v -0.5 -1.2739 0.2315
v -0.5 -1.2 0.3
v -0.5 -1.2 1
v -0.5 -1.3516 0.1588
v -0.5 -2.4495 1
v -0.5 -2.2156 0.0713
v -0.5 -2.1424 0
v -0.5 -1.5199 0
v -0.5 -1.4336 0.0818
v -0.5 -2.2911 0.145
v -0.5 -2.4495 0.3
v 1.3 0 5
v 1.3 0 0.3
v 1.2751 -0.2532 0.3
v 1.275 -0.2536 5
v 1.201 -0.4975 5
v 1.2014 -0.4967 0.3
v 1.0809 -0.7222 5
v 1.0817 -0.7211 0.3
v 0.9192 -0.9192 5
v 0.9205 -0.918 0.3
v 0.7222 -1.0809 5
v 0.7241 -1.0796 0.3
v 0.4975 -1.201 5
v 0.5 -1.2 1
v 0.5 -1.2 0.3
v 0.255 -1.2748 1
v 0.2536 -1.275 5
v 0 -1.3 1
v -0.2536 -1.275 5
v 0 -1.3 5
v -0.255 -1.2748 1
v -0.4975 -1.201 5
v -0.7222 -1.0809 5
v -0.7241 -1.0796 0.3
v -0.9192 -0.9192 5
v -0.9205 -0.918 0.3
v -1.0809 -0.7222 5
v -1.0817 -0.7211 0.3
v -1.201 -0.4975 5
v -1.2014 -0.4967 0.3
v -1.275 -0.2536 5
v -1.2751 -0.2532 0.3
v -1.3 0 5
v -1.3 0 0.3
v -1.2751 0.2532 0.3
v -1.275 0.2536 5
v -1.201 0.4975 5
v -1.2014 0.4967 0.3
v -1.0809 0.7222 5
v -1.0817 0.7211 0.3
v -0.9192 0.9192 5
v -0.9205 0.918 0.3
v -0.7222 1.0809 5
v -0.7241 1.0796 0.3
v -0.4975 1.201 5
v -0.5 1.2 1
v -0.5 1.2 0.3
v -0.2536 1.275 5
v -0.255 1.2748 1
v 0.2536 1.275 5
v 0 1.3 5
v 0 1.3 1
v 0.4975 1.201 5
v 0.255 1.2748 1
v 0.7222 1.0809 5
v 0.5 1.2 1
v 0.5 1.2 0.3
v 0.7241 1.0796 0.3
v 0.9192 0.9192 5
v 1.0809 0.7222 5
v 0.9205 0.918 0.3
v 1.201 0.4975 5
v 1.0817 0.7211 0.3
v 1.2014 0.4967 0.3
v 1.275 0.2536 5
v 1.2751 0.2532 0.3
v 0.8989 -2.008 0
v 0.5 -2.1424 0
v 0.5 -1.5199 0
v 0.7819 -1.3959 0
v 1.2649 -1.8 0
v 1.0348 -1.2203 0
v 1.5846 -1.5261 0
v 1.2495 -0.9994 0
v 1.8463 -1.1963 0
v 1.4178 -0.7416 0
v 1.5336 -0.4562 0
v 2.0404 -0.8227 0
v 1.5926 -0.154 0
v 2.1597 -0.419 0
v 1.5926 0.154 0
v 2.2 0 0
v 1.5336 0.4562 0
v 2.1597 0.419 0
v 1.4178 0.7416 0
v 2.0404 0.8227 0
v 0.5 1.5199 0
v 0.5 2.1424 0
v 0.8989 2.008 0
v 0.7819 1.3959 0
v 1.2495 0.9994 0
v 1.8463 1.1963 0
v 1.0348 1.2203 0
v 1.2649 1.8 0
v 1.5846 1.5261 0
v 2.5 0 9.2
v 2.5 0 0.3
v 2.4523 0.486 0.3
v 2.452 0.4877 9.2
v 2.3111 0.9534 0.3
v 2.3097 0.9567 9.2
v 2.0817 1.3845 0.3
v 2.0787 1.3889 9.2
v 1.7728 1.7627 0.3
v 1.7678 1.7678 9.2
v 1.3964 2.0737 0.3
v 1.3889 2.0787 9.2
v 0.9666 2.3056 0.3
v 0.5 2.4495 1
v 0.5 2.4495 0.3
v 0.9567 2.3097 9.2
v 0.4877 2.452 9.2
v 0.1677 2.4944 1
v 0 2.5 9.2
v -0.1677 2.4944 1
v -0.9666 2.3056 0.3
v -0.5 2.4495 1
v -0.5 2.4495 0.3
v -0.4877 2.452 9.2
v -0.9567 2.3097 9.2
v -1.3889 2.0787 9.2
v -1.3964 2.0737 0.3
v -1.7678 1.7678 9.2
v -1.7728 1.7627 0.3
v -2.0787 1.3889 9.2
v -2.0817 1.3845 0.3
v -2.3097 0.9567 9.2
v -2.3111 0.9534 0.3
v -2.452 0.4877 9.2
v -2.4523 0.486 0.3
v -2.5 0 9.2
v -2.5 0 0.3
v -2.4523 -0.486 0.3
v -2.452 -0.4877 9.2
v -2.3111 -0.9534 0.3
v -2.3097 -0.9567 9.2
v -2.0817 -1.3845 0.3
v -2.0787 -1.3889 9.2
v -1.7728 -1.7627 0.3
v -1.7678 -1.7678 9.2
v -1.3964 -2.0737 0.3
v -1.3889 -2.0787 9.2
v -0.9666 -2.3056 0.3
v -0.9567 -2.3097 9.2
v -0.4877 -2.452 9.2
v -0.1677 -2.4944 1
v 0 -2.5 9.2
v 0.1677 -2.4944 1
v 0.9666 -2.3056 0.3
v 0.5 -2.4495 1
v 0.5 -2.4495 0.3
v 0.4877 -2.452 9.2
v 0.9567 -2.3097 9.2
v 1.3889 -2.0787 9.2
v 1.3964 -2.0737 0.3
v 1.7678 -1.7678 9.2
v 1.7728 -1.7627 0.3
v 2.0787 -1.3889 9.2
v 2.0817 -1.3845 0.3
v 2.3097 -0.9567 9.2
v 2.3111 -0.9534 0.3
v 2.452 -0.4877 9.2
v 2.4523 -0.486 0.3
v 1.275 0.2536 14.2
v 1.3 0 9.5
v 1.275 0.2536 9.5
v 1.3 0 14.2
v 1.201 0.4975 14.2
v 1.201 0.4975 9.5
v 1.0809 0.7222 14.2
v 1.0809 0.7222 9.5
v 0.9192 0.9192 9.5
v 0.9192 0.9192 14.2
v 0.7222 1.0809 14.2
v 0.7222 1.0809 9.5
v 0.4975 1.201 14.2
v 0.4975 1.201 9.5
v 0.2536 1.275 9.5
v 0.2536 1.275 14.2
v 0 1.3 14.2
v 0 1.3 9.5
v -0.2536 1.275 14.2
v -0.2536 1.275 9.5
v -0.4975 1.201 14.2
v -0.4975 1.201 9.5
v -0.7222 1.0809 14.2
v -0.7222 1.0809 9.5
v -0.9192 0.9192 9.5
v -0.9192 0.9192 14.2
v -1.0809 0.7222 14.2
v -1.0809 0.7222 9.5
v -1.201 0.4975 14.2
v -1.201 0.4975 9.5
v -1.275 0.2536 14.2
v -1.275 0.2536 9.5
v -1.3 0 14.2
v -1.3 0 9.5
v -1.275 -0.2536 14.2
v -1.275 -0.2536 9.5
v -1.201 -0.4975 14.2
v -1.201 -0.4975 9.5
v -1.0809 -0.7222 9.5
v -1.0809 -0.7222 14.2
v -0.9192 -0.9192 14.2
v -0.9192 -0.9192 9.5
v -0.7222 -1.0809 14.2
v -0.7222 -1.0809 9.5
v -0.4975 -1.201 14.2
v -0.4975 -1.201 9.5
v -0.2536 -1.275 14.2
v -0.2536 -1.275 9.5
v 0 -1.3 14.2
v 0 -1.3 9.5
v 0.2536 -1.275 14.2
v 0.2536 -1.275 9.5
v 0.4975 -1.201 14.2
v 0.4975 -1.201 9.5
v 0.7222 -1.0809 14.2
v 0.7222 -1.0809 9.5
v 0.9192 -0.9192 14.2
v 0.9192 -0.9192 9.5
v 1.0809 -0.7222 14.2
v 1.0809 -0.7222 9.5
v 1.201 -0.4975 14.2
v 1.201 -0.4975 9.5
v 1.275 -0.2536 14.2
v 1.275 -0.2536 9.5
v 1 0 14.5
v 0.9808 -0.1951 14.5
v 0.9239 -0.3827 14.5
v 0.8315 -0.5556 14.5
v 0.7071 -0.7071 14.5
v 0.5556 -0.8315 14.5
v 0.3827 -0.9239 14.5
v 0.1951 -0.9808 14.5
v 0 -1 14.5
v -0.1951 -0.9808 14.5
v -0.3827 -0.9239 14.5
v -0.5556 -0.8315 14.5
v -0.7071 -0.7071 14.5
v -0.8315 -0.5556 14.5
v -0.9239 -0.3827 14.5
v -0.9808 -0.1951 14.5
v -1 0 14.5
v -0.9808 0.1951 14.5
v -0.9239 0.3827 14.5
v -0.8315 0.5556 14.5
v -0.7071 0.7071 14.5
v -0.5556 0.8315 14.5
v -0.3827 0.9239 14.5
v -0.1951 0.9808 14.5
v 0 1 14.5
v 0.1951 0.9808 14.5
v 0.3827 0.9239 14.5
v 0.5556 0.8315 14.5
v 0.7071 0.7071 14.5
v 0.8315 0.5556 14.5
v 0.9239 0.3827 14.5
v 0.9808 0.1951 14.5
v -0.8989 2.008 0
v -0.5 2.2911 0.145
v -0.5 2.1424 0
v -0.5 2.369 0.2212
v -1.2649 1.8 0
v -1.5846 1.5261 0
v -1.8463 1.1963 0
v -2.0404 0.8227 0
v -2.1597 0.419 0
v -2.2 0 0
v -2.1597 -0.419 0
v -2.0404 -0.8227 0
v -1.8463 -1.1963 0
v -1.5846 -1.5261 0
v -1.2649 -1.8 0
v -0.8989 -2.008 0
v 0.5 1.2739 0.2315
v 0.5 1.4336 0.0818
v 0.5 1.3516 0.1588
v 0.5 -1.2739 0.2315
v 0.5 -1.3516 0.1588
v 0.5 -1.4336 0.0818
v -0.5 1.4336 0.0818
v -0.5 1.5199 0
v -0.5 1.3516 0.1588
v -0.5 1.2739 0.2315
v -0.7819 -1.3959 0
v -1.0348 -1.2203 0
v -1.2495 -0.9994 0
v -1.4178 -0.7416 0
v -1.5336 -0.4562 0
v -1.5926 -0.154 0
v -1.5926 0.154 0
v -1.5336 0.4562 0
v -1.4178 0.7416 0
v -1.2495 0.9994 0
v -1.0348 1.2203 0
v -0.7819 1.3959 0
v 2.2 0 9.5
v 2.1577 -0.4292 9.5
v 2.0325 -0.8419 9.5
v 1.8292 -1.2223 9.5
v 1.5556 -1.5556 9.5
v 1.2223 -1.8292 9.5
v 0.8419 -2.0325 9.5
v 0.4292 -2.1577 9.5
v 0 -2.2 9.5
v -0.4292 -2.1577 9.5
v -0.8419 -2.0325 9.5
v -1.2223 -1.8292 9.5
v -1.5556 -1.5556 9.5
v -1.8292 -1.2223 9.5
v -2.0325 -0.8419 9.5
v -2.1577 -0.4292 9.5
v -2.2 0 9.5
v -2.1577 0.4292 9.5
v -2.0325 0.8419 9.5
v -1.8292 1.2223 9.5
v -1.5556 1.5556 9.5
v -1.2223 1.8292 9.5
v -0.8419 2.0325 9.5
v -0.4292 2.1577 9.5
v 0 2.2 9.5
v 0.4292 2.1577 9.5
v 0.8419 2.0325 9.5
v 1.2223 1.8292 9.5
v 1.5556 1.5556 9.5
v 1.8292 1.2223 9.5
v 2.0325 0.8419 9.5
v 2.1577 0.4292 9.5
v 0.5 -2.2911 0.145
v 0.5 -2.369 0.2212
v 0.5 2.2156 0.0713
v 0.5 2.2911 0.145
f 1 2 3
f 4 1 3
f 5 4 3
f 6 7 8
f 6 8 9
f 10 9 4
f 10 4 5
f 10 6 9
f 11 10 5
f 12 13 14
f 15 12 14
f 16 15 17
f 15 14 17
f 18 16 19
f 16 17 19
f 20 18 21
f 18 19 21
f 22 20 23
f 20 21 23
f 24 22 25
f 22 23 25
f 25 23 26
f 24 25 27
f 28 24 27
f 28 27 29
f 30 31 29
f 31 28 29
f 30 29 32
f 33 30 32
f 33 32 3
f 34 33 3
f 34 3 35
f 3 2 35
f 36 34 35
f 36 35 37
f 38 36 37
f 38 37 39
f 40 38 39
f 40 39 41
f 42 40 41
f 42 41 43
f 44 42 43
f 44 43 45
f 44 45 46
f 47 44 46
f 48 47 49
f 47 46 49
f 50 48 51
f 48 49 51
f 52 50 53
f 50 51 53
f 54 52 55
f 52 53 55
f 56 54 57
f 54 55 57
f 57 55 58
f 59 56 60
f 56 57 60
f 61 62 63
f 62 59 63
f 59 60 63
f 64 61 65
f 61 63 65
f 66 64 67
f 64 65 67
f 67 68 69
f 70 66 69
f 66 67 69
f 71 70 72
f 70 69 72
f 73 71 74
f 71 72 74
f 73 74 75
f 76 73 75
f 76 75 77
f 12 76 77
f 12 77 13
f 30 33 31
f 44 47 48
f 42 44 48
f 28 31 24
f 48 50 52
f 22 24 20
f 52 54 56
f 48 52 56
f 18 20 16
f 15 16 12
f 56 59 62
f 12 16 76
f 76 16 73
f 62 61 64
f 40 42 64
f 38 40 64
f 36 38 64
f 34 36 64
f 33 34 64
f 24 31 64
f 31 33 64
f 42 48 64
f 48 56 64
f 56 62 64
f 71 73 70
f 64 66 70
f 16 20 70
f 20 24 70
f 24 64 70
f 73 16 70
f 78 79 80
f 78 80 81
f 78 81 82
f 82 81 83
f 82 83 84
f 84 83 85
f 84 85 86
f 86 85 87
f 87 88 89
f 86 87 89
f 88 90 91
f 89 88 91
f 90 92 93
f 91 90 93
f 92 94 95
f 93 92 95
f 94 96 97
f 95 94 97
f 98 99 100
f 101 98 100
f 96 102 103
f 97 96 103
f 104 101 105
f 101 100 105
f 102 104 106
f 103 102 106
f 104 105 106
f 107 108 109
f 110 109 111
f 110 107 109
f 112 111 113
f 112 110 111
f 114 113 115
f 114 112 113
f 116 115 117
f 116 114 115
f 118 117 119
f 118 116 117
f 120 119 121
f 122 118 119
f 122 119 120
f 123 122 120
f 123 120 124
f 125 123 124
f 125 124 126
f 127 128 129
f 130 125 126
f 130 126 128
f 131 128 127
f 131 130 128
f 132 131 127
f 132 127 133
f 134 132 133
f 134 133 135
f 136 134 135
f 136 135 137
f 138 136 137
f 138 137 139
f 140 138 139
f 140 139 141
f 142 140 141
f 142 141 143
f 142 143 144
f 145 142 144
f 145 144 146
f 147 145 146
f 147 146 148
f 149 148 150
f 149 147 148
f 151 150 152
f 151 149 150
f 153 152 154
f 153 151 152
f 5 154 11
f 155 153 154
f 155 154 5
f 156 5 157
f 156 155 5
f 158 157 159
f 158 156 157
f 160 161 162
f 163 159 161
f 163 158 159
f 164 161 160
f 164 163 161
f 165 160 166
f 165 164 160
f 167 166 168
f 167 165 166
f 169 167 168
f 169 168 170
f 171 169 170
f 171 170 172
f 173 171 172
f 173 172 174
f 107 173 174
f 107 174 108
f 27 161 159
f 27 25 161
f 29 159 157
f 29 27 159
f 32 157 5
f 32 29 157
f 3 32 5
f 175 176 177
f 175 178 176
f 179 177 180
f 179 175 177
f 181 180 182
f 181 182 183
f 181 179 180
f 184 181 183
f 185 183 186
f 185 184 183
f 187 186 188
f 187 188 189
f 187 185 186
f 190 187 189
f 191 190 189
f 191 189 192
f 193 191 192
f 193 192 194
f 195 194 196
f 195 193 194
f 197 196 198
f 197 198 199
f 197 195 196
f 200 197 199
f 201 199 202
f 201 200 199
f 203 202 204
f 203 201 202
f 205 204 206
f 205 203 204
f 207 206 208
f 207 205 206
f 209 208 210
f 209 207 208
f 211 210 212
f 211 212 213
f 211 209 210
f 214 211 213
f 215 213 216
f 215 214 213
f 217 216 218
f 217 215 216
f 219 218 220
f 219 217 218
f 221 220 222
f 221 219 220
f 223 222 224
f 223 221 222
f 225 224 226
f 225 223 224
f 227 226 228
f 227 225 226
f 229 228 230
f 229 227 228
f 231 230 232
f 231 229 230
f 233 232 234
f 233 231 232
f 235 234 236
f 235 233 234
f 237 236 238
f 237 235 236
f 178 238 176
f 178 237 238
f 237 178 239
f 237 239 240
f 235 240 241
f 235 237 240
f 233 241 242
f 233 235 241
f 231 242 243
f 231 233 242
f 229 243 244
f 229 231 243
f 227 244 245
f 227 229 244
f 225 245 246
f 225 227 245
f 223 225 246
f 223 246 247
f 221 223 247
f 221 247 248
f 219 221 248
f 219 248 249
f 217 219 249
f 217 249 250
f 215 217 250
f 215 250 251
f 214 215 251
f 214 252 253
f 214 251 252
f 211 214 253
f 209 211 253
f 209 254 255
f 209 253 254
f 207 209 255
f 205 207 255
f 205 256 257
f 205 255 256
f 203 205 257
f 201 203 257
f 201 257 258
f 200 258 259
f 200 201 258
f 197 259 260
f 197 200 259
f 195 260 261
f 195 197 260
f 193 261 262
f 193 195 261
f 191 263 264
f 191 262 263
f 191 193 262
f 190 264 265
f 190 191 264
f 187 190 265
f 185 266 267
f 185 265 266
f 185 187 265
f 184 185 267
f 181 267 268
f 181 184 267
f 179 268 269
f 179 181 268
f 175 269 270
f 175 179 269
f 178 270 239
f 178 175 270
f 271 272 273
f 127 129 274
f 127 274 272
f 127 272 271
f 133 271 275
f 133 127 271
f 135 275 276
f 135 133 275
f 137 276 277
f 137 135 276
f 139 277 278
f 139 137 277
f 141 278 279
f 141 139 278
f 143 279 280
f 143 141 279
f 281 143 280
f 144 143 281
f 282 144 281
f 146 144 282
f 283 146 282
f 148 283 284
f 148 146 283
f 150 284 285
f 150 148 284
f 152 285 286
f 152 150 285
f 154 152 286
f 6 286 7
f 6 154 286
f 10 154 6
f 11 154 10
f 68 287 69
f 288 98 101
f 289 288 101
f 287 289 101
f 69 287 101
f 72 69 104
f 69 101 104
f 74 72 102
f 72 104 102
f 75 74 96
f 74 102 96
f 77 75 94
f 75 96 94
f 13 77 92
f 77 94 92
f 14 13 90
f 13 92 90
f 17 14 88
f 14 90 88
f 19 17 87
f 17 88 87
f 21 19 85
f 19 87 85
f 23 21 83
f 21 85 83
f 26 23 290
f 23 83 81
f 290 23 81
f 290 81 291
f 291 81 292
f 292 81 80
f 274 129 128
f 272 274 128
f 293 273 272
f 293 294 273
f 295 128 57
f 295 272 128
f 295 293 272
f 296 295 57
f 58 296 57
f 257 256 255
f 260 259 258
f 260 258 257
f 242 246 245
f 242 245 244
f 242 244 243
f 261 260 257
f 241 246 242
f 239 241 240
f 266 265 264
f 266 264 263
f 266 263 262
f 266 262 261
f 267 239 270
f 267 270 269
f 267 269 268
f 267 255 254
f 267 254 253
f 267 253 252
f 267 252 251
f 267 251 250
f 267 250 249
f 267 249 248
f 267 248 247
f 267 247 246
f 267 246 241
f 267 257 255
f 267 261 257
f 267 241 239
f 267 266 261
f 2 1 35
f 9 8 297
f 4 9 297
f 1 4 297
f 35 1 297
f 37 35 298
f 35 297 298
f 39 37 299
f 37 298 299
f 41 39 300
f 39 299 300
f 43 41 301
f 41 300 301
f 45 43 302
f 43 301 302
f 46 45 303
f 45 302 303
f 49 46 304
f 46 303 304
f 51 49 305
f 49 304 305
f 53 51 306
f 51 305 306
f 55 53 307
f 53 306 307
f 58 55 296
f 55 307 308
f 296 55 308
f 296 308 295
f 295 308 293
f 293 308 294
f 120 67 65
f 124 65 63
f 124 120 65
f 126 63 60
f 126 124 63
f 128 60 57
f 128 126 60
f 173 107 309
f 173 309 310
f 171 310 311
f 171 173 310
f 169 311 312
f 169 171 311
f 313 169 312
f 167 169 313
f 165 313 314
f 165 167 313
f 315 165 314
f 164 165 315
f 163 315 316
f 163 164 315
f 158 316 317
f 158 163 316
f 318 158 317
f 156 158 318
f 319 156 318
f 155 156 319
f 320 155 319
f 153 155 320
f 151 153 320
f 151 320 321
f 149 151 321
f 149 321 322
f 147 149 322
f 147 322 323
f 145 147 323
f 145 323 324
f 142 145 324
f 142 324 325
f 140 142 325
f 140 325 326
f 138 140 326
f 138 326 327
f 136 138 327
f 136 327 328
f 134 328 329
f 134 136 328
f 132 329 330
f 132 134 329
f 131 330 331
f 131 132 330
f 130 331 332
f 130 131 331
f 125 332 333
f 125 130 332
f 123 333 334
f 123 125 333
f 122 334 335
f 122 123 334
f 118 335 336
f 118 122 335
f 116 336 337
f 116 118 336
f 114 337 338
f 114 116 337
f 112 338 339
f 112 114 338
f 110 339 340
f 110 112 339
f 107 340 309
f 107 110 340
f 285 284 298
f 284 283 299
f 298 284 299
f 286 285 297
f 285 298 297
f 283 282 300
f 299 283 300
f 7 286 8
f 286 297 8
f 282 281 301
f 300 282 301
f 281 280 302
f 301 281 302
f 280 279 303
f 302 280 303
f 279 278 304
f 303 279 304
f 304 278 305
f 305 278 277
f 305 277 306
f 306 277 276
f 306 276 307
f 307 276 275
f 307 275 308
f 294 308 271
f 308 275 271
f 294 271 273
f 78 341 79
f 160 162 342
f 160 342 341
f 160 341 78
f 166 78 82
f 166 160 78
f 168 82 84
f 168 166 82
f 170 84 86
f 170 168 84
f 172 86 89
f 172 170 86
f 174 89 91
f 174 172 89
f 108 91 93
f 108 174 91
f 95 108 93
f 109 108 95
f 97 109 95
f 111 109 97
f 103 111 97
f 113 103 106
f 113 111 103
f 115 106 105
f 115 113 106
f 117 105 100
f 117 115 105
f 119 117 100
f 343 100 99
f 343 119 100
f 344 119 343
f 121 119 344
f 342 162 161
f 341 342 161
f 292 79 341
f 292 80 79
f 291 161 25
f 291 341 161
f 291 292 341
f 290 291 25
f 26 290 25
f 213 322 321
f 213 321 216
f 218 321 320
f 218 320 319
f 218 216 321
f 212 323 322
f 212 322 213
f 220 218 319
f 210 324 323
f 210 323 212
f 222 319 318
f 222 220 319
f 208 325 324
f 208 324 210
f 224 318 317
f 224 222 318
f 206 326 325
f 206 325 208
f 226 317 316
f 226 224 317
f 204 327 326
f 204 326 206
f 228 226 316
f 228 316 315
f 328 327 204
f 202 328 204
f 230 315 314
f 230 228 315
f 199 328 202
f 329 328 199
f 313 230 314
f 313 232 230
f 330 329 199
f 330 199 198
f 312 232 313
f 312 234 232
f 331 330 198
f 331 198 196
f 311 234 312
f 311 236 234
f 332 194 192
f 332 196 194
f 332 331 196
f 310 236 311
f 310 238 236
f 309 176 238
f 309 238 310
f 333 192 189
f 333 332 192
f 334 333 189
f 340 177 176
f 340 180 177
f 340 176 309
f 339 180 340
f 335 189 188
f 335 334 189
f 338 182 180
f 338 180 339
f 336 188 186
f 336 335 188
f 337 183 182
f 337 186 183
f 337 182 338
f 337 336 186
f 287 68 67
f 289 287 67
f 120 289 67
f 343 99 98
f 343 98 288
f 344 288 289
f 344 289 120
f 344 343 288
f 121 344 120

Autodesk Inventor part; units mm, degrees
ref_plane "YZ Plane" through (0, 0, 0) normal (1, 0, 0) x (0, 1, 0)
ref_plane "XZ Plane" through (0, 0, 0) normal (0, 1, 0) x (-1, 0, 0)
ref_plane "XY Plane" through (0, 0, 0) normal (0, 0, 1) x (1, 0, 0)
sketch "スケッチ1" plane through (0, 0, 0) normal (0, 1, 0) x (-1, 0, 0)
  line L0 (-1.6, 0) -> (-2.2, 0)
  line L1 (-2.5, 0.3) -> (-2.5, 9.2)
  line L2 (-2.2, 9.5) -> (-1.3, 9.5)
  line L3 (-1.3, 9.5) -> (-1.3, 14.2)
  line L4 (-1, 14.5) -> (0, 14.5)
  line L5 (0, 14.5) -> (0, 5)
  line L6 (0, 5) -> (-1.3, 5)
  line L7 (-1.3, 5) -> (-1.3, 0.3)
  line L8 (-1.3, 14.2) -> (-1, 14.5)
  line L9 (-2.5, 9.2) -> (-2.2, 9.5)
  line L10 (-2.5, 0.3) -> (-2.2, 0)
  line L11 (-1.6, 0) -> (-1.3, 0.3)
  line L12 (0, -2.9) -> (0, 17.4) projected
  point P0 (0, 0)
  point P1 (-2.5, 0)
  point P2 (-2.5, 9.5)
  point P3 (-1.3, 14.5)
  point P4 (-1.3, 0)
  dimension "d0" = 2.6
  dimension "d1" = 5
  dimension "d2" = 9.5
  dimension "d3" = 5
  dimension "d4" = 5
  dimension "d5" = 2.6
  dimension "d6" = 0.3
  dimension "d7" = 0.3
  dimension "d8" = 0.3
  dimension "d9" = 0.3
  dimension "d10" = 0.3
  dimension "d11" = 0.3
  dimension "d12" = 0.3
  dimension "d13" = 0.3
revolve "回転1" add sketch "スケッチ1" angle 360 about axis through (0, 0, -10) along (0, 0, 1)
thread "ねじ1" size "M2.6x0.45" class "6g" standard "ANSI Metric M Profile" full length
thread "ねじ2" size "M2.6x0.45" class "6H" standard "ANSI Metric M Profile" full length
sketch "スケッチ2" plane through (0, 0, 0) normal (0, 0, -1) x (-1, 0, 0)
  line L0 (-0.5, 2.5) -> (0.5, 2.5)
  line L1 (0.5, 2.5) -> (0.5, -2.5)
  line L2 (0.5, -2.5) -> (-0.5, -2.5)
  line L3 (-0.5, -2.5) -> (-0.5, 2.5)
  line L4 (-0.5, 2.5) -> (0.5, -2.5) construction
  line L5 (0.5, 2.5) -> (-0.5, -2.5) construction
  circle A0 centre (0, 0) radius 2.5 projected
  point P0 (0.5, 2.4495)
  point P1 (-0.5, 2.4495)
  point P2 (-0.5, -2.4495)
  point P3 (0.5, -2.4495)
  dimension "d19" = 1
extrude "押し出し1" cut sketch "スケッチ2" against normal blind 1 contours A0 L1 L3
equation "\"d7\" = d6"
equation "\"d8\" = d6"
equation "\"d9\" = d8"
equation "\"d10\" = d6"
equation "\"d11\" = d10"
equation "\"d12\" = d6"
equation "\"d13\" = d12"
properties part number "BRU-2609.5S" material "ステンレス鋼 AISI 304"
